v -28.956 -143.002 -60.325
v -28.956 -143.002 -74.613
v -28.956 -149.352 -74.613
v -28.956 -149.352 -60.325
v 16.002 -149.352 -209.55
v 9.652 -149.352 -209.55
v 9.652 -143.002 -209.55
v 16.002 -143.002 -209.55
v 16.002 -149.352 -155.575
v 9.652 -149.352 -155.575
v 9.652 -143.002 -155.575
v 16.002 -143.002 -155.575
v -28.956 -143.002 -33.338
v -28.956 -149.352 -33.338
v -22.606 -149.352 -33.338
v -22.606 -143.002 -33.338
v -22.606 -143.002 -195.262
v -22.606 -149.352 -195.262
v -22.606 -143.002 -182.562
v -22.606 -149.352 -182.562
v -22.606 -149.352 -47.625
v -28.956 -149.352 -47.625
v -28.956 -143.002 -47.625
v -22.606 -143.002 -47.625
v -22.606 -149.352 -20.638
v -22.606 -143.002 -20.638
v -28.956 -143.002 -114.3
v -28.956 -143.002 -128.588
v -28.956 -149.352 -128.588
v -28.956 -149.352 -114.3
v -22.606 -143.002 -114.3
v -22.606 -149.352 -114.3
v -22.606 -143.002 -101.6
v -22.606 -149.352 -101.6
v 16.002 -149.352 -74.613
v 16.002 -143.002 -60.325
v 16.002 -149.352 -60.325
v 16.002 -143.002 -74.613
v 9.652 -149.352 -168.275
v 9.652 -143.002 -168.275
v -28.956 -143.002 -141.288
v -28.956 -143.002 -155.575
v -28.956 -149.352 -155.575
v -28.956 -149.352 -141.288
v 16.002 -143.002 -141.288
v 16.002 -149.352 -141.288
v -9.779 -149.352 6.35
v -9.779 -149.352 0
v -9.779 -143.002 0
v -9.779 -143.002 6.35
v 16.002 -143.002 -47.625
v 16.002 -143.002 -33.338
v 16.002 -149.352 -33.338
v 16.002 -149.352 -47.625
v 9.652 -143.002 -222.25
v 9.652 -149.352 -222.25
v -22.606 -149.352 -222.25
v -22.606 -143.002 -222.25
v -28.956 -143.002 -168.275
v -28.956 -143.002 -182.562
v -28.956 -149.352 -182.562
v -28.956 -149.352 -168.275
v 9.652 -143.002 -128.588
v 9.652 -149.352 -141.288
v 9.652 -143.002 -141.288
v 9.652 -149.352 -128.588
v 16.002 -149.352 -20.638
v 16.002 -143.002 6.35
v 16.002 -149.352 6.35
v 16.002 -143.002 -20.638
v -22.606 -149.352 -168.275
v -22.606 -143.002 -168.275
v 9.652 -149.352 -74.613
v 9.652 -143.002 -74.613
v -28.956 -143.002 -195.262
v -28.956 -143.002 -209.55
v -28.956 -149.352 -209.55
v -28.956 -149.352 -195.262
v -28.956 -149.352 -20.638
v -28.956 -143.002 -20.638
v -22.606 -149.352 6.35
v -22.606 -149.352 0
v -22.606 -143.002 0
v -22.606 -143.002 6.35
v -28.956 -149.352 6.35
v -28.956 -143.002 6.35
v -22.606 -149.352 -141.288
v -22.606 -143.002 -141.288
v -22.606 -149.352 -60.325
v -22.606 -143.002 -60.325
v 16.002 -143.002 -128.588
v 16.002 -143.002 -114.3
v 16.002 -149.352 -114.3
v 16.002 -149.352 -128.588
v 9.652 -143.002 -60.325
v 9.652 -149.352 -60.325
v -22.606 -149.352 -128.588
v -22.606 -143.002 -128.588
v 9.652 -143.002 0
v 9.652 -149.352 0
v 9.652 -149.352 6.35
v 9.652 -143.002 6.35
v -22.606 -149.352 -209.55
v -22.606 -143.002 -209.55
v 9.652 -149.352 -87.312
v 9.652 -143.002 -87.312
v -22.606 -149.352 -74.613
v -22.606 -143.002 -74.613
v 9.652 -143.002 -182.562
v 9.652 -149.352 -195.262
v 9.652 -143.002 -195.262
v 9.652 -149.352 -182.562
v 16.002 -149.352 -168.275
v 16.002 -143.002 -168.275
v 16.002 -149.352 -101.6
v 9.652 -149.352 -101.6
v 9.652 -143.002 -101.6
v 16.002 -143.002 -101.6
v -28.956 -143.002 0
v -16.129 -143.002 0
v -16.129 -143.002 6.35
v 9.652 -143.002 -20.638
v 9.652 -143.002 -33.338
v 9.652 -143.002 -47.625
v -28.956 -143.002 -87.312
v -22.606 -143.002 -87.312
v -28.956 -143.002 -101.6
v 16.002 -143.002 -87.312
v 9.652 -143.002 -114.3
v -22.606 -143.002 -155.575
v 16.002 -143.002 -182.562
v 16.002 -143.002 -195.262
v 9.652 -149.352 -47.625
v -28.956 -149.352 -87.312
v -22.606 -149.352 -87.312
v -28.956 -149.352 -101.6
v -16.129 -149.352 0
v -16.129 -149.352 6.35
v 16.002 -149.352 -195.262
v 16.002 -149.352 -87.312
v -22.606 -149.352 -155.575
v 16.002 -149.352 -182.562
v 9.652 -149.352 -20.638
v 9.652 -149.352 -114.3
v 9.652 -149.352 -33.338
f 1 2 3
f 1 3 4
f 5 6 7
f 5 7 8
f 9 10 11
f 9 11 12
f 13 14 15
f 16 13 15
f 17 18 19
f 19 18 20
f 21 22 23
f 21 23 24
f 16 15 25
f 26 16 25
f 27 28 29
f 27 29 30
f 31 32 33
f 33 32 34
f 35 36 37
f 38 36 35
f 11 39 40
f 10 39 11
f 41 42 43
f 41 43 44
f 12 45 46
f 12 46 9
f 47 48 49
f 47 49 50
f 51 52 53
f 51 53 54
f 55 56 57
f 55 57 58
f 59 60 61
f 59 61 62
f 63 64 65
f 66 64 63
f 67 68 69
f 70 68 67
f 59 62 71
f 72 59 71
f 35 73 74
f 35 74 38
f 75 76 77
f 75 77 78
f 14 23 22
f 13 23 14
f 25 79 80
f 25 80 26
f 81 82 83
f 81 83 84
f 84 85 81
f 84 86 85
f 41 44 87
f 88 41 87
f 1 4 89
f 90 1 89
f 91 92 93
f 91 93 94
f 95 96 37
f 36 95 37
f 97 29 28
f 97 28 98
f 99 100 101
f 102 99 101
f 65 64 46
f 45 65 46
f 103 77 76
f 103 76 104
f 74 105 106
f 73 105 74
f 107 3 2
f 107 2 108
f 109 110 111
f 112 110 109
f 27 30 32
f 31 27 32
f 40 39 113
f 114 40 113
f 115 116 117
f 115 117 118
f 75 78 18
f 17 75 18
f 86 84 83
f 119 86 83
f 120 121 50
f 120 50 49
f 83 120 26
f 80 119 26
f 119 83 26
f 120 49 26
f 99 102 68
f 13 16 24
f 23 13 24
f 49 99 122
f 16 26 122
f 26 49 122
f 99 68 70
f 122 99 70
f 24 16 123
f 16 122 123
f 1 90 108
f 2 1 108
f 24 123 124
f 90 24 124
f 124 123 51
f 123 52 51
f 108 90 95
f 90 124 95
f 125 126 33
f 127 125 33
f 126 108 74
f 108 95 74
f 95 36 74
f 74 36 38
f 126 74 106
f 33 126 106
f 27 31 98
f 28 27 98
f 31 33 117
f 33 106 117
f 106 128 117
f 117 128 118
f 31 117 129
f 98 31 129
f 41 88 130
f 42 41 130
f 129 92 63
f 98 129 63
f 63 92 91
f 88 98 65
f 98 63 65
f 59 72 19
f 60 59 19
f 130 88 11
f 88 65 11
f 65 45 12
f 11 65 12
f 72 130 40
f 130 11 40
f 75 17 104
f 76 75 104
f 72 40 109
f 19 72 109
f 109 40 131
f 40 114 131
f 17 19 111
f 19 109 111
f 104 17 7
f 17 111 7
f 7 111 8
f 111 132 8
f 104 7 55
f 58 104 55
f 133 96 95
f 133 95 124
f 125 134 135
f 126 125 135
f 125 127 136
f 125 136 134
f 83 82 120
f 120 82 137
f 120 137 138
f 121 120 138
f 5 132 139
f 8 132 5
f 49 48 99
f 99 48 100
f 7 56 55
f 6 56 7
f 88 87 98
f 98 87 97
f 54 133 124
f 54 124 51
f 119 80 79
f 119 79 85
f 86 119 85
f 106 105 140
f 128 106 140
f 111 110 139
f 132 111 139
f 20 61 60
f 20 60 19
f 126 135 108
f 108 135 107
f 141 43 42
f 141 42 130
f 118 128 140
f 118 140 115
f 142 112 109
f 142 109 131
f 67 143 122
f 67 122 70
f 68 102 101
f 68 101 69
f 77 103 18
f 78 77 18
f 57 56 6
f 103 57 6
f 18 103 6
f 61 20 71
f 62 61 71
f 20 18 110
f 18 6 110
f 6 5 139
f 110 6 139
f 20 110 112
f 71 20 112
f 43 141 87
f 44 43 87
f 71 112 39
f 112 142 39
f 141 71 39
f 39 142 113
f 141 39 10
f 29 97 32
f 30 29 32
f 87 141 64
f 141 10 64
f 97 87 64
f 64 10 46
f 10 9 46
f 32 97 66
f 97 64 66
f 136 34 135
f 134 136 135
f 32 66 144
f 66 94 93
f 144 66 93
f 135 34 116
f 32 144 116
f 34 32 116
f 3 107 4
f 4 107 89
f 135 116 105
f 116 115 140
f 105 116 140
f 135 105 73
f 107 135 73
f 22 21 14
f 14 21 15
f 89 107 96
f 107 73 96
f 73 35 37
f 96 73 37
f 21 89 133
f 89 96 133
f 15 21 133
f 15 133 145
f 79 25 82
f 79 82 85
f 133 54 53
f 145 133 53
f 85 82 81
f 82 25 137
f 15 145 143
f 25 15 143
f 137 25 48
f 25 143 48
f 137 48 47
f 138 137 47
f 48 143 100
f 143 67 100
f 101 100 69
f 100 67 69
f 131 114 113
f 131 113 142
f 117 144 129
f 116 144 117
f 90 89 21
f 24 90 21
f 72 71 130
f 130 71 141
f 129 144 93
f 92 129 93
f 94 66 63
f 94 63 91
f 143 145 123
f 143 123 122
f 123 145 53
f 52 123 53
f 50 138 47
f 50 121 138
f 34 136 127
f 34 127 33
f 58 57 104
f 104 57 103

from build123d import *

# Parameters (mm, degrees)
SKETCH1_W           = 44.958
SKETCH1_H           = 304.8
BOSS_EXTRUDE1_DEPTH = 6.35
SKETCH2_W           = 6.35
SKETCH2_H           = 101.6
BOSS_EXTRUDE2_DEPTH = 6.35
SKETCH3_W           = 222.25
SKETCH3_H           = 6.35
BOSS_EXTRUDE3_DEPTH = 38.608
SKETCH7_W           = 333.372738736
SKETCH7_H           = 323.725005723
CUT_EXTRUDE1_DEPTH  = 45.958
SKETCH4_W           = 6.35
SKETCH4_H           = 12.7
CUT_EXTRUDE2_DEPTH  = 6.35
SKETCH8_W           = 6.477
SKETCH8_H           = 6.35
SKETCH8_W_2         = 19.431
CUT_EXTRUDE4_DEPTH  = 7.35


with BuildPart() as part:
    # Sketch1 → Boss-Extrude1 (new body)
    with BuildSketch(Plane.XY):
        with Locations((-6.477, 3.048)):
            Rectangle(SKETCH1_W, SKETCH1_H)
        with BuildLine():
            Line((-3.302, 133.858), (-3.302, -143.002))
            Line((-3.302, -143.002), (3.302, -143.002))
            Line((3.302, -143.002), (3.302, 143.002))
            Line((3.302, 143.002), (-16.256, 143.002))
            Line((-16.256, 143.002), (-16.256, 136.398))
            Line((-16.256, 136.398), (-5.842, 136.398))
            ThreePointArc((-5.842, 136.398), (-4.045948776, 135.654051224), (-3.302, 133.858))
        make_face(mode=Mode.SUBTRACT)
    extrude(amount=BOSS_EXTRUDE1_DEPTH)

    # Sketch2 → Boss-Extrude2 (add)
    with BuildSketch(Plane(origin=(16.002, 0, 0), x_dir=(0, 0, -1), z_dir=(1, 0, 0))):
        Polygon((222.25, -60.452), (222.25, -47.752), (0, -47.752), (0, -149.352), (222.25, -149.352), (222.25, -136.652), (228.6, -136.652), (228.6, -119.718666667), (222.25, -119.718666667), (222.25, -107.018666667), (228.6, -107.018666667), (228.6, -90.085333333), (222.25, -90.085333333), (222.25, -77.385333333), (228.6, -77.385333333), (228.6, -60.452), align=None)
        with BuildLine():
            ThreePointArc((11.4, -116.592), (9.9, -118.092), (8.4, -116.592))
            Line((8.4, -116.592), (8.4, -111.512))
            ThreePointArc((8.4, -111.512), (9.9, -110.012), (11.4, -111.512))
            Line((11.4, -111.512), (11.4, -116.592))
        make_face(mode=Mode.SUBTRACT)
        with BuildLine():
            Line((42.4, -111.512), (42.4, -116.592))
            ThreePointArc((42.4, -116.592), (40.9, -118.092), (39.4, -116.592))
            Line((39.4, -116.592), (39.4, -111.512))
            ThreePointArc((39.4, -111.512), (40.9, -110.012), (42.4, -111.512))
        make_face(mode=Mode.SUBTRACT)
        with BuildLine():
            ThreePointArc((36.4, -101.092), (25.4, -112.092), (14.4, -101.092))
            Line((14.4, -101.092), (14.4, -96.012))
            ThreePointArc((14.4, -96.012), (25.4, -85.012), (36.4, -96.012))
            Line((36.4, -96.012), (36.4, -101.092))
        make_face(mode=Mode.SUBTRACT)
        with BuildLine():
            ThreePointArc((11.4, -85.592), (9.9, -87.092), (8.4, -85.592))
            Line((8.4, -85.592), (8.4, -80.512))
            ThreePointArc((8.4, -80.512), (9.9, -79.012), (11.4, -80.512))
            Line((11.4, -80.512), (11.4, -85.592))
        make_face(mode=Mode.SUBTRACT)
        with BuildLine():
            ThreePointArc((42.4, -85.592), (40.9, -87.092), (39.4, -85.592))
            Line((39.4, -85.592), (39.4, -80.512))
            ThreePointArc((39.4, -80.512), (40.9, -79.012), (42.4, -80.512))
            Line((42.4, -80.512), (42.4, -85.592))
        make_face(mode=Mode.SUBTRACT)
        with Locations((-3.175, -98.552)):
            Rectangle(SKETCH2_W, SKETCH2_H)
    extrude(amount=-BOSS_EXTRUDE2_DEPTH)

    # Sketch3 → Boss-Extrude3 (add)
    with BuildSketch(Plane.ZY.offset(-9.652)):
        with Locations((-111.125, -146.177)):
            Rectangle(SKETCH3_W, SKETCH3_H)
    extrude(amount=BOSS_EXTRUDE3_DEPTH)

    # Sketch7 → Cut-Extrude1 (cut, through all)
    with BuildSketch(Plane(origin=(16.002, 0, 0), x_dir=(0, 0, -1), z_dir=(1, 0, 0))):
        with Locations((160.336369368, 18.860502861)):
            Rectangle(SKETCH7_W, SKETCH7_H)
    extrude(amount=-CUT_EXTRUDE1_DEPTH, mode=Mode.SUBTRACT)

    # Sketch4 → Cut-Extrude2 (cut)
    with BuildSketch(Plane.XZ.offset(149.352)):
        with Locations((12.827, -26.9875)):
            Rectangle(SKETCH4_W, SKETCH4_H)
        with Locations((-25.781, -26.9875)):
            Rectangle(SKETCH4_W, SKETCH4_H)
        with Locations((-25.781, -53.975)):
            Rectangle(SKETCH4_W, SKETCH4_H)
        with Locations((-25.781, -80.9625)):
            Rectangle(SKETCH4_W, SKETCH4_H)
        with Locations((-25.781, -107.95)):
            Rectangle(SKETCH4_W, SKETCH4_H)
        with Locations((-25.781, -134.9375)):
            Rectangle(SKETCH4_W, SKETCH4_H)
        with Locations((-25.781, -161.925)):
            Rectangle(SKETCH4_W, SKETCH4_H)
        with Locations((-25.781, -188.9125)):
            Rectangle(SKETCH4_W, SKETCH4_H)
        with Locations((-25.781, -215.9)):
            Rectangle(SKETCH4_W, SKETCH4_H)
        with Locations((12.827, -215.9)):
            Rectangle(SKETCH4_W, SKETCH4_H)
        with Locations((12.827, -161.925)):
            Rectangle(SKETCH4_W, SKETCH4_H)
        with Locations((12.827, -134.9375)):
            Rectangle(SKETCH4_W, SKETCH4_H)
        with Locations((12.827, -107.95)):
            Rectangle(SKETCH4_W, SKETCH4_H)
        with Locations((12.827, -80.9625)):
            Rectangle(SKETCH4_W, SKETCH4_H)
        with Locations((12.827, -53.975)):
            Rectangle(SKETCH4_W, SKETCH4_H)
        with Locations((12.827, -188.9125)):
            Rectangle(SKETCH4_W, SKETCH4_H)
    extrude(amount=-CUT_EXTRUDE2_DEPTH, mode=Mode.SUBTRACT)

    # Sketch8 → Cut-Extrude4 (cut, through all)
    with BuildSketch(Plane.XZ.offset(149.352)):
        with Locations((-19.3675, 3.175)):
            Rectangle(SKETCH8_W, SKETCH8_H)
        with Locations((-0.0635, 3.175)):
            Rectangle(SKETCH8_W_2, SKETCH8_H)
    extrude(amount=-CUT_EXTRUDE4_DEPTH, mode=Mode.SUBTRACT)


solid = part.part
